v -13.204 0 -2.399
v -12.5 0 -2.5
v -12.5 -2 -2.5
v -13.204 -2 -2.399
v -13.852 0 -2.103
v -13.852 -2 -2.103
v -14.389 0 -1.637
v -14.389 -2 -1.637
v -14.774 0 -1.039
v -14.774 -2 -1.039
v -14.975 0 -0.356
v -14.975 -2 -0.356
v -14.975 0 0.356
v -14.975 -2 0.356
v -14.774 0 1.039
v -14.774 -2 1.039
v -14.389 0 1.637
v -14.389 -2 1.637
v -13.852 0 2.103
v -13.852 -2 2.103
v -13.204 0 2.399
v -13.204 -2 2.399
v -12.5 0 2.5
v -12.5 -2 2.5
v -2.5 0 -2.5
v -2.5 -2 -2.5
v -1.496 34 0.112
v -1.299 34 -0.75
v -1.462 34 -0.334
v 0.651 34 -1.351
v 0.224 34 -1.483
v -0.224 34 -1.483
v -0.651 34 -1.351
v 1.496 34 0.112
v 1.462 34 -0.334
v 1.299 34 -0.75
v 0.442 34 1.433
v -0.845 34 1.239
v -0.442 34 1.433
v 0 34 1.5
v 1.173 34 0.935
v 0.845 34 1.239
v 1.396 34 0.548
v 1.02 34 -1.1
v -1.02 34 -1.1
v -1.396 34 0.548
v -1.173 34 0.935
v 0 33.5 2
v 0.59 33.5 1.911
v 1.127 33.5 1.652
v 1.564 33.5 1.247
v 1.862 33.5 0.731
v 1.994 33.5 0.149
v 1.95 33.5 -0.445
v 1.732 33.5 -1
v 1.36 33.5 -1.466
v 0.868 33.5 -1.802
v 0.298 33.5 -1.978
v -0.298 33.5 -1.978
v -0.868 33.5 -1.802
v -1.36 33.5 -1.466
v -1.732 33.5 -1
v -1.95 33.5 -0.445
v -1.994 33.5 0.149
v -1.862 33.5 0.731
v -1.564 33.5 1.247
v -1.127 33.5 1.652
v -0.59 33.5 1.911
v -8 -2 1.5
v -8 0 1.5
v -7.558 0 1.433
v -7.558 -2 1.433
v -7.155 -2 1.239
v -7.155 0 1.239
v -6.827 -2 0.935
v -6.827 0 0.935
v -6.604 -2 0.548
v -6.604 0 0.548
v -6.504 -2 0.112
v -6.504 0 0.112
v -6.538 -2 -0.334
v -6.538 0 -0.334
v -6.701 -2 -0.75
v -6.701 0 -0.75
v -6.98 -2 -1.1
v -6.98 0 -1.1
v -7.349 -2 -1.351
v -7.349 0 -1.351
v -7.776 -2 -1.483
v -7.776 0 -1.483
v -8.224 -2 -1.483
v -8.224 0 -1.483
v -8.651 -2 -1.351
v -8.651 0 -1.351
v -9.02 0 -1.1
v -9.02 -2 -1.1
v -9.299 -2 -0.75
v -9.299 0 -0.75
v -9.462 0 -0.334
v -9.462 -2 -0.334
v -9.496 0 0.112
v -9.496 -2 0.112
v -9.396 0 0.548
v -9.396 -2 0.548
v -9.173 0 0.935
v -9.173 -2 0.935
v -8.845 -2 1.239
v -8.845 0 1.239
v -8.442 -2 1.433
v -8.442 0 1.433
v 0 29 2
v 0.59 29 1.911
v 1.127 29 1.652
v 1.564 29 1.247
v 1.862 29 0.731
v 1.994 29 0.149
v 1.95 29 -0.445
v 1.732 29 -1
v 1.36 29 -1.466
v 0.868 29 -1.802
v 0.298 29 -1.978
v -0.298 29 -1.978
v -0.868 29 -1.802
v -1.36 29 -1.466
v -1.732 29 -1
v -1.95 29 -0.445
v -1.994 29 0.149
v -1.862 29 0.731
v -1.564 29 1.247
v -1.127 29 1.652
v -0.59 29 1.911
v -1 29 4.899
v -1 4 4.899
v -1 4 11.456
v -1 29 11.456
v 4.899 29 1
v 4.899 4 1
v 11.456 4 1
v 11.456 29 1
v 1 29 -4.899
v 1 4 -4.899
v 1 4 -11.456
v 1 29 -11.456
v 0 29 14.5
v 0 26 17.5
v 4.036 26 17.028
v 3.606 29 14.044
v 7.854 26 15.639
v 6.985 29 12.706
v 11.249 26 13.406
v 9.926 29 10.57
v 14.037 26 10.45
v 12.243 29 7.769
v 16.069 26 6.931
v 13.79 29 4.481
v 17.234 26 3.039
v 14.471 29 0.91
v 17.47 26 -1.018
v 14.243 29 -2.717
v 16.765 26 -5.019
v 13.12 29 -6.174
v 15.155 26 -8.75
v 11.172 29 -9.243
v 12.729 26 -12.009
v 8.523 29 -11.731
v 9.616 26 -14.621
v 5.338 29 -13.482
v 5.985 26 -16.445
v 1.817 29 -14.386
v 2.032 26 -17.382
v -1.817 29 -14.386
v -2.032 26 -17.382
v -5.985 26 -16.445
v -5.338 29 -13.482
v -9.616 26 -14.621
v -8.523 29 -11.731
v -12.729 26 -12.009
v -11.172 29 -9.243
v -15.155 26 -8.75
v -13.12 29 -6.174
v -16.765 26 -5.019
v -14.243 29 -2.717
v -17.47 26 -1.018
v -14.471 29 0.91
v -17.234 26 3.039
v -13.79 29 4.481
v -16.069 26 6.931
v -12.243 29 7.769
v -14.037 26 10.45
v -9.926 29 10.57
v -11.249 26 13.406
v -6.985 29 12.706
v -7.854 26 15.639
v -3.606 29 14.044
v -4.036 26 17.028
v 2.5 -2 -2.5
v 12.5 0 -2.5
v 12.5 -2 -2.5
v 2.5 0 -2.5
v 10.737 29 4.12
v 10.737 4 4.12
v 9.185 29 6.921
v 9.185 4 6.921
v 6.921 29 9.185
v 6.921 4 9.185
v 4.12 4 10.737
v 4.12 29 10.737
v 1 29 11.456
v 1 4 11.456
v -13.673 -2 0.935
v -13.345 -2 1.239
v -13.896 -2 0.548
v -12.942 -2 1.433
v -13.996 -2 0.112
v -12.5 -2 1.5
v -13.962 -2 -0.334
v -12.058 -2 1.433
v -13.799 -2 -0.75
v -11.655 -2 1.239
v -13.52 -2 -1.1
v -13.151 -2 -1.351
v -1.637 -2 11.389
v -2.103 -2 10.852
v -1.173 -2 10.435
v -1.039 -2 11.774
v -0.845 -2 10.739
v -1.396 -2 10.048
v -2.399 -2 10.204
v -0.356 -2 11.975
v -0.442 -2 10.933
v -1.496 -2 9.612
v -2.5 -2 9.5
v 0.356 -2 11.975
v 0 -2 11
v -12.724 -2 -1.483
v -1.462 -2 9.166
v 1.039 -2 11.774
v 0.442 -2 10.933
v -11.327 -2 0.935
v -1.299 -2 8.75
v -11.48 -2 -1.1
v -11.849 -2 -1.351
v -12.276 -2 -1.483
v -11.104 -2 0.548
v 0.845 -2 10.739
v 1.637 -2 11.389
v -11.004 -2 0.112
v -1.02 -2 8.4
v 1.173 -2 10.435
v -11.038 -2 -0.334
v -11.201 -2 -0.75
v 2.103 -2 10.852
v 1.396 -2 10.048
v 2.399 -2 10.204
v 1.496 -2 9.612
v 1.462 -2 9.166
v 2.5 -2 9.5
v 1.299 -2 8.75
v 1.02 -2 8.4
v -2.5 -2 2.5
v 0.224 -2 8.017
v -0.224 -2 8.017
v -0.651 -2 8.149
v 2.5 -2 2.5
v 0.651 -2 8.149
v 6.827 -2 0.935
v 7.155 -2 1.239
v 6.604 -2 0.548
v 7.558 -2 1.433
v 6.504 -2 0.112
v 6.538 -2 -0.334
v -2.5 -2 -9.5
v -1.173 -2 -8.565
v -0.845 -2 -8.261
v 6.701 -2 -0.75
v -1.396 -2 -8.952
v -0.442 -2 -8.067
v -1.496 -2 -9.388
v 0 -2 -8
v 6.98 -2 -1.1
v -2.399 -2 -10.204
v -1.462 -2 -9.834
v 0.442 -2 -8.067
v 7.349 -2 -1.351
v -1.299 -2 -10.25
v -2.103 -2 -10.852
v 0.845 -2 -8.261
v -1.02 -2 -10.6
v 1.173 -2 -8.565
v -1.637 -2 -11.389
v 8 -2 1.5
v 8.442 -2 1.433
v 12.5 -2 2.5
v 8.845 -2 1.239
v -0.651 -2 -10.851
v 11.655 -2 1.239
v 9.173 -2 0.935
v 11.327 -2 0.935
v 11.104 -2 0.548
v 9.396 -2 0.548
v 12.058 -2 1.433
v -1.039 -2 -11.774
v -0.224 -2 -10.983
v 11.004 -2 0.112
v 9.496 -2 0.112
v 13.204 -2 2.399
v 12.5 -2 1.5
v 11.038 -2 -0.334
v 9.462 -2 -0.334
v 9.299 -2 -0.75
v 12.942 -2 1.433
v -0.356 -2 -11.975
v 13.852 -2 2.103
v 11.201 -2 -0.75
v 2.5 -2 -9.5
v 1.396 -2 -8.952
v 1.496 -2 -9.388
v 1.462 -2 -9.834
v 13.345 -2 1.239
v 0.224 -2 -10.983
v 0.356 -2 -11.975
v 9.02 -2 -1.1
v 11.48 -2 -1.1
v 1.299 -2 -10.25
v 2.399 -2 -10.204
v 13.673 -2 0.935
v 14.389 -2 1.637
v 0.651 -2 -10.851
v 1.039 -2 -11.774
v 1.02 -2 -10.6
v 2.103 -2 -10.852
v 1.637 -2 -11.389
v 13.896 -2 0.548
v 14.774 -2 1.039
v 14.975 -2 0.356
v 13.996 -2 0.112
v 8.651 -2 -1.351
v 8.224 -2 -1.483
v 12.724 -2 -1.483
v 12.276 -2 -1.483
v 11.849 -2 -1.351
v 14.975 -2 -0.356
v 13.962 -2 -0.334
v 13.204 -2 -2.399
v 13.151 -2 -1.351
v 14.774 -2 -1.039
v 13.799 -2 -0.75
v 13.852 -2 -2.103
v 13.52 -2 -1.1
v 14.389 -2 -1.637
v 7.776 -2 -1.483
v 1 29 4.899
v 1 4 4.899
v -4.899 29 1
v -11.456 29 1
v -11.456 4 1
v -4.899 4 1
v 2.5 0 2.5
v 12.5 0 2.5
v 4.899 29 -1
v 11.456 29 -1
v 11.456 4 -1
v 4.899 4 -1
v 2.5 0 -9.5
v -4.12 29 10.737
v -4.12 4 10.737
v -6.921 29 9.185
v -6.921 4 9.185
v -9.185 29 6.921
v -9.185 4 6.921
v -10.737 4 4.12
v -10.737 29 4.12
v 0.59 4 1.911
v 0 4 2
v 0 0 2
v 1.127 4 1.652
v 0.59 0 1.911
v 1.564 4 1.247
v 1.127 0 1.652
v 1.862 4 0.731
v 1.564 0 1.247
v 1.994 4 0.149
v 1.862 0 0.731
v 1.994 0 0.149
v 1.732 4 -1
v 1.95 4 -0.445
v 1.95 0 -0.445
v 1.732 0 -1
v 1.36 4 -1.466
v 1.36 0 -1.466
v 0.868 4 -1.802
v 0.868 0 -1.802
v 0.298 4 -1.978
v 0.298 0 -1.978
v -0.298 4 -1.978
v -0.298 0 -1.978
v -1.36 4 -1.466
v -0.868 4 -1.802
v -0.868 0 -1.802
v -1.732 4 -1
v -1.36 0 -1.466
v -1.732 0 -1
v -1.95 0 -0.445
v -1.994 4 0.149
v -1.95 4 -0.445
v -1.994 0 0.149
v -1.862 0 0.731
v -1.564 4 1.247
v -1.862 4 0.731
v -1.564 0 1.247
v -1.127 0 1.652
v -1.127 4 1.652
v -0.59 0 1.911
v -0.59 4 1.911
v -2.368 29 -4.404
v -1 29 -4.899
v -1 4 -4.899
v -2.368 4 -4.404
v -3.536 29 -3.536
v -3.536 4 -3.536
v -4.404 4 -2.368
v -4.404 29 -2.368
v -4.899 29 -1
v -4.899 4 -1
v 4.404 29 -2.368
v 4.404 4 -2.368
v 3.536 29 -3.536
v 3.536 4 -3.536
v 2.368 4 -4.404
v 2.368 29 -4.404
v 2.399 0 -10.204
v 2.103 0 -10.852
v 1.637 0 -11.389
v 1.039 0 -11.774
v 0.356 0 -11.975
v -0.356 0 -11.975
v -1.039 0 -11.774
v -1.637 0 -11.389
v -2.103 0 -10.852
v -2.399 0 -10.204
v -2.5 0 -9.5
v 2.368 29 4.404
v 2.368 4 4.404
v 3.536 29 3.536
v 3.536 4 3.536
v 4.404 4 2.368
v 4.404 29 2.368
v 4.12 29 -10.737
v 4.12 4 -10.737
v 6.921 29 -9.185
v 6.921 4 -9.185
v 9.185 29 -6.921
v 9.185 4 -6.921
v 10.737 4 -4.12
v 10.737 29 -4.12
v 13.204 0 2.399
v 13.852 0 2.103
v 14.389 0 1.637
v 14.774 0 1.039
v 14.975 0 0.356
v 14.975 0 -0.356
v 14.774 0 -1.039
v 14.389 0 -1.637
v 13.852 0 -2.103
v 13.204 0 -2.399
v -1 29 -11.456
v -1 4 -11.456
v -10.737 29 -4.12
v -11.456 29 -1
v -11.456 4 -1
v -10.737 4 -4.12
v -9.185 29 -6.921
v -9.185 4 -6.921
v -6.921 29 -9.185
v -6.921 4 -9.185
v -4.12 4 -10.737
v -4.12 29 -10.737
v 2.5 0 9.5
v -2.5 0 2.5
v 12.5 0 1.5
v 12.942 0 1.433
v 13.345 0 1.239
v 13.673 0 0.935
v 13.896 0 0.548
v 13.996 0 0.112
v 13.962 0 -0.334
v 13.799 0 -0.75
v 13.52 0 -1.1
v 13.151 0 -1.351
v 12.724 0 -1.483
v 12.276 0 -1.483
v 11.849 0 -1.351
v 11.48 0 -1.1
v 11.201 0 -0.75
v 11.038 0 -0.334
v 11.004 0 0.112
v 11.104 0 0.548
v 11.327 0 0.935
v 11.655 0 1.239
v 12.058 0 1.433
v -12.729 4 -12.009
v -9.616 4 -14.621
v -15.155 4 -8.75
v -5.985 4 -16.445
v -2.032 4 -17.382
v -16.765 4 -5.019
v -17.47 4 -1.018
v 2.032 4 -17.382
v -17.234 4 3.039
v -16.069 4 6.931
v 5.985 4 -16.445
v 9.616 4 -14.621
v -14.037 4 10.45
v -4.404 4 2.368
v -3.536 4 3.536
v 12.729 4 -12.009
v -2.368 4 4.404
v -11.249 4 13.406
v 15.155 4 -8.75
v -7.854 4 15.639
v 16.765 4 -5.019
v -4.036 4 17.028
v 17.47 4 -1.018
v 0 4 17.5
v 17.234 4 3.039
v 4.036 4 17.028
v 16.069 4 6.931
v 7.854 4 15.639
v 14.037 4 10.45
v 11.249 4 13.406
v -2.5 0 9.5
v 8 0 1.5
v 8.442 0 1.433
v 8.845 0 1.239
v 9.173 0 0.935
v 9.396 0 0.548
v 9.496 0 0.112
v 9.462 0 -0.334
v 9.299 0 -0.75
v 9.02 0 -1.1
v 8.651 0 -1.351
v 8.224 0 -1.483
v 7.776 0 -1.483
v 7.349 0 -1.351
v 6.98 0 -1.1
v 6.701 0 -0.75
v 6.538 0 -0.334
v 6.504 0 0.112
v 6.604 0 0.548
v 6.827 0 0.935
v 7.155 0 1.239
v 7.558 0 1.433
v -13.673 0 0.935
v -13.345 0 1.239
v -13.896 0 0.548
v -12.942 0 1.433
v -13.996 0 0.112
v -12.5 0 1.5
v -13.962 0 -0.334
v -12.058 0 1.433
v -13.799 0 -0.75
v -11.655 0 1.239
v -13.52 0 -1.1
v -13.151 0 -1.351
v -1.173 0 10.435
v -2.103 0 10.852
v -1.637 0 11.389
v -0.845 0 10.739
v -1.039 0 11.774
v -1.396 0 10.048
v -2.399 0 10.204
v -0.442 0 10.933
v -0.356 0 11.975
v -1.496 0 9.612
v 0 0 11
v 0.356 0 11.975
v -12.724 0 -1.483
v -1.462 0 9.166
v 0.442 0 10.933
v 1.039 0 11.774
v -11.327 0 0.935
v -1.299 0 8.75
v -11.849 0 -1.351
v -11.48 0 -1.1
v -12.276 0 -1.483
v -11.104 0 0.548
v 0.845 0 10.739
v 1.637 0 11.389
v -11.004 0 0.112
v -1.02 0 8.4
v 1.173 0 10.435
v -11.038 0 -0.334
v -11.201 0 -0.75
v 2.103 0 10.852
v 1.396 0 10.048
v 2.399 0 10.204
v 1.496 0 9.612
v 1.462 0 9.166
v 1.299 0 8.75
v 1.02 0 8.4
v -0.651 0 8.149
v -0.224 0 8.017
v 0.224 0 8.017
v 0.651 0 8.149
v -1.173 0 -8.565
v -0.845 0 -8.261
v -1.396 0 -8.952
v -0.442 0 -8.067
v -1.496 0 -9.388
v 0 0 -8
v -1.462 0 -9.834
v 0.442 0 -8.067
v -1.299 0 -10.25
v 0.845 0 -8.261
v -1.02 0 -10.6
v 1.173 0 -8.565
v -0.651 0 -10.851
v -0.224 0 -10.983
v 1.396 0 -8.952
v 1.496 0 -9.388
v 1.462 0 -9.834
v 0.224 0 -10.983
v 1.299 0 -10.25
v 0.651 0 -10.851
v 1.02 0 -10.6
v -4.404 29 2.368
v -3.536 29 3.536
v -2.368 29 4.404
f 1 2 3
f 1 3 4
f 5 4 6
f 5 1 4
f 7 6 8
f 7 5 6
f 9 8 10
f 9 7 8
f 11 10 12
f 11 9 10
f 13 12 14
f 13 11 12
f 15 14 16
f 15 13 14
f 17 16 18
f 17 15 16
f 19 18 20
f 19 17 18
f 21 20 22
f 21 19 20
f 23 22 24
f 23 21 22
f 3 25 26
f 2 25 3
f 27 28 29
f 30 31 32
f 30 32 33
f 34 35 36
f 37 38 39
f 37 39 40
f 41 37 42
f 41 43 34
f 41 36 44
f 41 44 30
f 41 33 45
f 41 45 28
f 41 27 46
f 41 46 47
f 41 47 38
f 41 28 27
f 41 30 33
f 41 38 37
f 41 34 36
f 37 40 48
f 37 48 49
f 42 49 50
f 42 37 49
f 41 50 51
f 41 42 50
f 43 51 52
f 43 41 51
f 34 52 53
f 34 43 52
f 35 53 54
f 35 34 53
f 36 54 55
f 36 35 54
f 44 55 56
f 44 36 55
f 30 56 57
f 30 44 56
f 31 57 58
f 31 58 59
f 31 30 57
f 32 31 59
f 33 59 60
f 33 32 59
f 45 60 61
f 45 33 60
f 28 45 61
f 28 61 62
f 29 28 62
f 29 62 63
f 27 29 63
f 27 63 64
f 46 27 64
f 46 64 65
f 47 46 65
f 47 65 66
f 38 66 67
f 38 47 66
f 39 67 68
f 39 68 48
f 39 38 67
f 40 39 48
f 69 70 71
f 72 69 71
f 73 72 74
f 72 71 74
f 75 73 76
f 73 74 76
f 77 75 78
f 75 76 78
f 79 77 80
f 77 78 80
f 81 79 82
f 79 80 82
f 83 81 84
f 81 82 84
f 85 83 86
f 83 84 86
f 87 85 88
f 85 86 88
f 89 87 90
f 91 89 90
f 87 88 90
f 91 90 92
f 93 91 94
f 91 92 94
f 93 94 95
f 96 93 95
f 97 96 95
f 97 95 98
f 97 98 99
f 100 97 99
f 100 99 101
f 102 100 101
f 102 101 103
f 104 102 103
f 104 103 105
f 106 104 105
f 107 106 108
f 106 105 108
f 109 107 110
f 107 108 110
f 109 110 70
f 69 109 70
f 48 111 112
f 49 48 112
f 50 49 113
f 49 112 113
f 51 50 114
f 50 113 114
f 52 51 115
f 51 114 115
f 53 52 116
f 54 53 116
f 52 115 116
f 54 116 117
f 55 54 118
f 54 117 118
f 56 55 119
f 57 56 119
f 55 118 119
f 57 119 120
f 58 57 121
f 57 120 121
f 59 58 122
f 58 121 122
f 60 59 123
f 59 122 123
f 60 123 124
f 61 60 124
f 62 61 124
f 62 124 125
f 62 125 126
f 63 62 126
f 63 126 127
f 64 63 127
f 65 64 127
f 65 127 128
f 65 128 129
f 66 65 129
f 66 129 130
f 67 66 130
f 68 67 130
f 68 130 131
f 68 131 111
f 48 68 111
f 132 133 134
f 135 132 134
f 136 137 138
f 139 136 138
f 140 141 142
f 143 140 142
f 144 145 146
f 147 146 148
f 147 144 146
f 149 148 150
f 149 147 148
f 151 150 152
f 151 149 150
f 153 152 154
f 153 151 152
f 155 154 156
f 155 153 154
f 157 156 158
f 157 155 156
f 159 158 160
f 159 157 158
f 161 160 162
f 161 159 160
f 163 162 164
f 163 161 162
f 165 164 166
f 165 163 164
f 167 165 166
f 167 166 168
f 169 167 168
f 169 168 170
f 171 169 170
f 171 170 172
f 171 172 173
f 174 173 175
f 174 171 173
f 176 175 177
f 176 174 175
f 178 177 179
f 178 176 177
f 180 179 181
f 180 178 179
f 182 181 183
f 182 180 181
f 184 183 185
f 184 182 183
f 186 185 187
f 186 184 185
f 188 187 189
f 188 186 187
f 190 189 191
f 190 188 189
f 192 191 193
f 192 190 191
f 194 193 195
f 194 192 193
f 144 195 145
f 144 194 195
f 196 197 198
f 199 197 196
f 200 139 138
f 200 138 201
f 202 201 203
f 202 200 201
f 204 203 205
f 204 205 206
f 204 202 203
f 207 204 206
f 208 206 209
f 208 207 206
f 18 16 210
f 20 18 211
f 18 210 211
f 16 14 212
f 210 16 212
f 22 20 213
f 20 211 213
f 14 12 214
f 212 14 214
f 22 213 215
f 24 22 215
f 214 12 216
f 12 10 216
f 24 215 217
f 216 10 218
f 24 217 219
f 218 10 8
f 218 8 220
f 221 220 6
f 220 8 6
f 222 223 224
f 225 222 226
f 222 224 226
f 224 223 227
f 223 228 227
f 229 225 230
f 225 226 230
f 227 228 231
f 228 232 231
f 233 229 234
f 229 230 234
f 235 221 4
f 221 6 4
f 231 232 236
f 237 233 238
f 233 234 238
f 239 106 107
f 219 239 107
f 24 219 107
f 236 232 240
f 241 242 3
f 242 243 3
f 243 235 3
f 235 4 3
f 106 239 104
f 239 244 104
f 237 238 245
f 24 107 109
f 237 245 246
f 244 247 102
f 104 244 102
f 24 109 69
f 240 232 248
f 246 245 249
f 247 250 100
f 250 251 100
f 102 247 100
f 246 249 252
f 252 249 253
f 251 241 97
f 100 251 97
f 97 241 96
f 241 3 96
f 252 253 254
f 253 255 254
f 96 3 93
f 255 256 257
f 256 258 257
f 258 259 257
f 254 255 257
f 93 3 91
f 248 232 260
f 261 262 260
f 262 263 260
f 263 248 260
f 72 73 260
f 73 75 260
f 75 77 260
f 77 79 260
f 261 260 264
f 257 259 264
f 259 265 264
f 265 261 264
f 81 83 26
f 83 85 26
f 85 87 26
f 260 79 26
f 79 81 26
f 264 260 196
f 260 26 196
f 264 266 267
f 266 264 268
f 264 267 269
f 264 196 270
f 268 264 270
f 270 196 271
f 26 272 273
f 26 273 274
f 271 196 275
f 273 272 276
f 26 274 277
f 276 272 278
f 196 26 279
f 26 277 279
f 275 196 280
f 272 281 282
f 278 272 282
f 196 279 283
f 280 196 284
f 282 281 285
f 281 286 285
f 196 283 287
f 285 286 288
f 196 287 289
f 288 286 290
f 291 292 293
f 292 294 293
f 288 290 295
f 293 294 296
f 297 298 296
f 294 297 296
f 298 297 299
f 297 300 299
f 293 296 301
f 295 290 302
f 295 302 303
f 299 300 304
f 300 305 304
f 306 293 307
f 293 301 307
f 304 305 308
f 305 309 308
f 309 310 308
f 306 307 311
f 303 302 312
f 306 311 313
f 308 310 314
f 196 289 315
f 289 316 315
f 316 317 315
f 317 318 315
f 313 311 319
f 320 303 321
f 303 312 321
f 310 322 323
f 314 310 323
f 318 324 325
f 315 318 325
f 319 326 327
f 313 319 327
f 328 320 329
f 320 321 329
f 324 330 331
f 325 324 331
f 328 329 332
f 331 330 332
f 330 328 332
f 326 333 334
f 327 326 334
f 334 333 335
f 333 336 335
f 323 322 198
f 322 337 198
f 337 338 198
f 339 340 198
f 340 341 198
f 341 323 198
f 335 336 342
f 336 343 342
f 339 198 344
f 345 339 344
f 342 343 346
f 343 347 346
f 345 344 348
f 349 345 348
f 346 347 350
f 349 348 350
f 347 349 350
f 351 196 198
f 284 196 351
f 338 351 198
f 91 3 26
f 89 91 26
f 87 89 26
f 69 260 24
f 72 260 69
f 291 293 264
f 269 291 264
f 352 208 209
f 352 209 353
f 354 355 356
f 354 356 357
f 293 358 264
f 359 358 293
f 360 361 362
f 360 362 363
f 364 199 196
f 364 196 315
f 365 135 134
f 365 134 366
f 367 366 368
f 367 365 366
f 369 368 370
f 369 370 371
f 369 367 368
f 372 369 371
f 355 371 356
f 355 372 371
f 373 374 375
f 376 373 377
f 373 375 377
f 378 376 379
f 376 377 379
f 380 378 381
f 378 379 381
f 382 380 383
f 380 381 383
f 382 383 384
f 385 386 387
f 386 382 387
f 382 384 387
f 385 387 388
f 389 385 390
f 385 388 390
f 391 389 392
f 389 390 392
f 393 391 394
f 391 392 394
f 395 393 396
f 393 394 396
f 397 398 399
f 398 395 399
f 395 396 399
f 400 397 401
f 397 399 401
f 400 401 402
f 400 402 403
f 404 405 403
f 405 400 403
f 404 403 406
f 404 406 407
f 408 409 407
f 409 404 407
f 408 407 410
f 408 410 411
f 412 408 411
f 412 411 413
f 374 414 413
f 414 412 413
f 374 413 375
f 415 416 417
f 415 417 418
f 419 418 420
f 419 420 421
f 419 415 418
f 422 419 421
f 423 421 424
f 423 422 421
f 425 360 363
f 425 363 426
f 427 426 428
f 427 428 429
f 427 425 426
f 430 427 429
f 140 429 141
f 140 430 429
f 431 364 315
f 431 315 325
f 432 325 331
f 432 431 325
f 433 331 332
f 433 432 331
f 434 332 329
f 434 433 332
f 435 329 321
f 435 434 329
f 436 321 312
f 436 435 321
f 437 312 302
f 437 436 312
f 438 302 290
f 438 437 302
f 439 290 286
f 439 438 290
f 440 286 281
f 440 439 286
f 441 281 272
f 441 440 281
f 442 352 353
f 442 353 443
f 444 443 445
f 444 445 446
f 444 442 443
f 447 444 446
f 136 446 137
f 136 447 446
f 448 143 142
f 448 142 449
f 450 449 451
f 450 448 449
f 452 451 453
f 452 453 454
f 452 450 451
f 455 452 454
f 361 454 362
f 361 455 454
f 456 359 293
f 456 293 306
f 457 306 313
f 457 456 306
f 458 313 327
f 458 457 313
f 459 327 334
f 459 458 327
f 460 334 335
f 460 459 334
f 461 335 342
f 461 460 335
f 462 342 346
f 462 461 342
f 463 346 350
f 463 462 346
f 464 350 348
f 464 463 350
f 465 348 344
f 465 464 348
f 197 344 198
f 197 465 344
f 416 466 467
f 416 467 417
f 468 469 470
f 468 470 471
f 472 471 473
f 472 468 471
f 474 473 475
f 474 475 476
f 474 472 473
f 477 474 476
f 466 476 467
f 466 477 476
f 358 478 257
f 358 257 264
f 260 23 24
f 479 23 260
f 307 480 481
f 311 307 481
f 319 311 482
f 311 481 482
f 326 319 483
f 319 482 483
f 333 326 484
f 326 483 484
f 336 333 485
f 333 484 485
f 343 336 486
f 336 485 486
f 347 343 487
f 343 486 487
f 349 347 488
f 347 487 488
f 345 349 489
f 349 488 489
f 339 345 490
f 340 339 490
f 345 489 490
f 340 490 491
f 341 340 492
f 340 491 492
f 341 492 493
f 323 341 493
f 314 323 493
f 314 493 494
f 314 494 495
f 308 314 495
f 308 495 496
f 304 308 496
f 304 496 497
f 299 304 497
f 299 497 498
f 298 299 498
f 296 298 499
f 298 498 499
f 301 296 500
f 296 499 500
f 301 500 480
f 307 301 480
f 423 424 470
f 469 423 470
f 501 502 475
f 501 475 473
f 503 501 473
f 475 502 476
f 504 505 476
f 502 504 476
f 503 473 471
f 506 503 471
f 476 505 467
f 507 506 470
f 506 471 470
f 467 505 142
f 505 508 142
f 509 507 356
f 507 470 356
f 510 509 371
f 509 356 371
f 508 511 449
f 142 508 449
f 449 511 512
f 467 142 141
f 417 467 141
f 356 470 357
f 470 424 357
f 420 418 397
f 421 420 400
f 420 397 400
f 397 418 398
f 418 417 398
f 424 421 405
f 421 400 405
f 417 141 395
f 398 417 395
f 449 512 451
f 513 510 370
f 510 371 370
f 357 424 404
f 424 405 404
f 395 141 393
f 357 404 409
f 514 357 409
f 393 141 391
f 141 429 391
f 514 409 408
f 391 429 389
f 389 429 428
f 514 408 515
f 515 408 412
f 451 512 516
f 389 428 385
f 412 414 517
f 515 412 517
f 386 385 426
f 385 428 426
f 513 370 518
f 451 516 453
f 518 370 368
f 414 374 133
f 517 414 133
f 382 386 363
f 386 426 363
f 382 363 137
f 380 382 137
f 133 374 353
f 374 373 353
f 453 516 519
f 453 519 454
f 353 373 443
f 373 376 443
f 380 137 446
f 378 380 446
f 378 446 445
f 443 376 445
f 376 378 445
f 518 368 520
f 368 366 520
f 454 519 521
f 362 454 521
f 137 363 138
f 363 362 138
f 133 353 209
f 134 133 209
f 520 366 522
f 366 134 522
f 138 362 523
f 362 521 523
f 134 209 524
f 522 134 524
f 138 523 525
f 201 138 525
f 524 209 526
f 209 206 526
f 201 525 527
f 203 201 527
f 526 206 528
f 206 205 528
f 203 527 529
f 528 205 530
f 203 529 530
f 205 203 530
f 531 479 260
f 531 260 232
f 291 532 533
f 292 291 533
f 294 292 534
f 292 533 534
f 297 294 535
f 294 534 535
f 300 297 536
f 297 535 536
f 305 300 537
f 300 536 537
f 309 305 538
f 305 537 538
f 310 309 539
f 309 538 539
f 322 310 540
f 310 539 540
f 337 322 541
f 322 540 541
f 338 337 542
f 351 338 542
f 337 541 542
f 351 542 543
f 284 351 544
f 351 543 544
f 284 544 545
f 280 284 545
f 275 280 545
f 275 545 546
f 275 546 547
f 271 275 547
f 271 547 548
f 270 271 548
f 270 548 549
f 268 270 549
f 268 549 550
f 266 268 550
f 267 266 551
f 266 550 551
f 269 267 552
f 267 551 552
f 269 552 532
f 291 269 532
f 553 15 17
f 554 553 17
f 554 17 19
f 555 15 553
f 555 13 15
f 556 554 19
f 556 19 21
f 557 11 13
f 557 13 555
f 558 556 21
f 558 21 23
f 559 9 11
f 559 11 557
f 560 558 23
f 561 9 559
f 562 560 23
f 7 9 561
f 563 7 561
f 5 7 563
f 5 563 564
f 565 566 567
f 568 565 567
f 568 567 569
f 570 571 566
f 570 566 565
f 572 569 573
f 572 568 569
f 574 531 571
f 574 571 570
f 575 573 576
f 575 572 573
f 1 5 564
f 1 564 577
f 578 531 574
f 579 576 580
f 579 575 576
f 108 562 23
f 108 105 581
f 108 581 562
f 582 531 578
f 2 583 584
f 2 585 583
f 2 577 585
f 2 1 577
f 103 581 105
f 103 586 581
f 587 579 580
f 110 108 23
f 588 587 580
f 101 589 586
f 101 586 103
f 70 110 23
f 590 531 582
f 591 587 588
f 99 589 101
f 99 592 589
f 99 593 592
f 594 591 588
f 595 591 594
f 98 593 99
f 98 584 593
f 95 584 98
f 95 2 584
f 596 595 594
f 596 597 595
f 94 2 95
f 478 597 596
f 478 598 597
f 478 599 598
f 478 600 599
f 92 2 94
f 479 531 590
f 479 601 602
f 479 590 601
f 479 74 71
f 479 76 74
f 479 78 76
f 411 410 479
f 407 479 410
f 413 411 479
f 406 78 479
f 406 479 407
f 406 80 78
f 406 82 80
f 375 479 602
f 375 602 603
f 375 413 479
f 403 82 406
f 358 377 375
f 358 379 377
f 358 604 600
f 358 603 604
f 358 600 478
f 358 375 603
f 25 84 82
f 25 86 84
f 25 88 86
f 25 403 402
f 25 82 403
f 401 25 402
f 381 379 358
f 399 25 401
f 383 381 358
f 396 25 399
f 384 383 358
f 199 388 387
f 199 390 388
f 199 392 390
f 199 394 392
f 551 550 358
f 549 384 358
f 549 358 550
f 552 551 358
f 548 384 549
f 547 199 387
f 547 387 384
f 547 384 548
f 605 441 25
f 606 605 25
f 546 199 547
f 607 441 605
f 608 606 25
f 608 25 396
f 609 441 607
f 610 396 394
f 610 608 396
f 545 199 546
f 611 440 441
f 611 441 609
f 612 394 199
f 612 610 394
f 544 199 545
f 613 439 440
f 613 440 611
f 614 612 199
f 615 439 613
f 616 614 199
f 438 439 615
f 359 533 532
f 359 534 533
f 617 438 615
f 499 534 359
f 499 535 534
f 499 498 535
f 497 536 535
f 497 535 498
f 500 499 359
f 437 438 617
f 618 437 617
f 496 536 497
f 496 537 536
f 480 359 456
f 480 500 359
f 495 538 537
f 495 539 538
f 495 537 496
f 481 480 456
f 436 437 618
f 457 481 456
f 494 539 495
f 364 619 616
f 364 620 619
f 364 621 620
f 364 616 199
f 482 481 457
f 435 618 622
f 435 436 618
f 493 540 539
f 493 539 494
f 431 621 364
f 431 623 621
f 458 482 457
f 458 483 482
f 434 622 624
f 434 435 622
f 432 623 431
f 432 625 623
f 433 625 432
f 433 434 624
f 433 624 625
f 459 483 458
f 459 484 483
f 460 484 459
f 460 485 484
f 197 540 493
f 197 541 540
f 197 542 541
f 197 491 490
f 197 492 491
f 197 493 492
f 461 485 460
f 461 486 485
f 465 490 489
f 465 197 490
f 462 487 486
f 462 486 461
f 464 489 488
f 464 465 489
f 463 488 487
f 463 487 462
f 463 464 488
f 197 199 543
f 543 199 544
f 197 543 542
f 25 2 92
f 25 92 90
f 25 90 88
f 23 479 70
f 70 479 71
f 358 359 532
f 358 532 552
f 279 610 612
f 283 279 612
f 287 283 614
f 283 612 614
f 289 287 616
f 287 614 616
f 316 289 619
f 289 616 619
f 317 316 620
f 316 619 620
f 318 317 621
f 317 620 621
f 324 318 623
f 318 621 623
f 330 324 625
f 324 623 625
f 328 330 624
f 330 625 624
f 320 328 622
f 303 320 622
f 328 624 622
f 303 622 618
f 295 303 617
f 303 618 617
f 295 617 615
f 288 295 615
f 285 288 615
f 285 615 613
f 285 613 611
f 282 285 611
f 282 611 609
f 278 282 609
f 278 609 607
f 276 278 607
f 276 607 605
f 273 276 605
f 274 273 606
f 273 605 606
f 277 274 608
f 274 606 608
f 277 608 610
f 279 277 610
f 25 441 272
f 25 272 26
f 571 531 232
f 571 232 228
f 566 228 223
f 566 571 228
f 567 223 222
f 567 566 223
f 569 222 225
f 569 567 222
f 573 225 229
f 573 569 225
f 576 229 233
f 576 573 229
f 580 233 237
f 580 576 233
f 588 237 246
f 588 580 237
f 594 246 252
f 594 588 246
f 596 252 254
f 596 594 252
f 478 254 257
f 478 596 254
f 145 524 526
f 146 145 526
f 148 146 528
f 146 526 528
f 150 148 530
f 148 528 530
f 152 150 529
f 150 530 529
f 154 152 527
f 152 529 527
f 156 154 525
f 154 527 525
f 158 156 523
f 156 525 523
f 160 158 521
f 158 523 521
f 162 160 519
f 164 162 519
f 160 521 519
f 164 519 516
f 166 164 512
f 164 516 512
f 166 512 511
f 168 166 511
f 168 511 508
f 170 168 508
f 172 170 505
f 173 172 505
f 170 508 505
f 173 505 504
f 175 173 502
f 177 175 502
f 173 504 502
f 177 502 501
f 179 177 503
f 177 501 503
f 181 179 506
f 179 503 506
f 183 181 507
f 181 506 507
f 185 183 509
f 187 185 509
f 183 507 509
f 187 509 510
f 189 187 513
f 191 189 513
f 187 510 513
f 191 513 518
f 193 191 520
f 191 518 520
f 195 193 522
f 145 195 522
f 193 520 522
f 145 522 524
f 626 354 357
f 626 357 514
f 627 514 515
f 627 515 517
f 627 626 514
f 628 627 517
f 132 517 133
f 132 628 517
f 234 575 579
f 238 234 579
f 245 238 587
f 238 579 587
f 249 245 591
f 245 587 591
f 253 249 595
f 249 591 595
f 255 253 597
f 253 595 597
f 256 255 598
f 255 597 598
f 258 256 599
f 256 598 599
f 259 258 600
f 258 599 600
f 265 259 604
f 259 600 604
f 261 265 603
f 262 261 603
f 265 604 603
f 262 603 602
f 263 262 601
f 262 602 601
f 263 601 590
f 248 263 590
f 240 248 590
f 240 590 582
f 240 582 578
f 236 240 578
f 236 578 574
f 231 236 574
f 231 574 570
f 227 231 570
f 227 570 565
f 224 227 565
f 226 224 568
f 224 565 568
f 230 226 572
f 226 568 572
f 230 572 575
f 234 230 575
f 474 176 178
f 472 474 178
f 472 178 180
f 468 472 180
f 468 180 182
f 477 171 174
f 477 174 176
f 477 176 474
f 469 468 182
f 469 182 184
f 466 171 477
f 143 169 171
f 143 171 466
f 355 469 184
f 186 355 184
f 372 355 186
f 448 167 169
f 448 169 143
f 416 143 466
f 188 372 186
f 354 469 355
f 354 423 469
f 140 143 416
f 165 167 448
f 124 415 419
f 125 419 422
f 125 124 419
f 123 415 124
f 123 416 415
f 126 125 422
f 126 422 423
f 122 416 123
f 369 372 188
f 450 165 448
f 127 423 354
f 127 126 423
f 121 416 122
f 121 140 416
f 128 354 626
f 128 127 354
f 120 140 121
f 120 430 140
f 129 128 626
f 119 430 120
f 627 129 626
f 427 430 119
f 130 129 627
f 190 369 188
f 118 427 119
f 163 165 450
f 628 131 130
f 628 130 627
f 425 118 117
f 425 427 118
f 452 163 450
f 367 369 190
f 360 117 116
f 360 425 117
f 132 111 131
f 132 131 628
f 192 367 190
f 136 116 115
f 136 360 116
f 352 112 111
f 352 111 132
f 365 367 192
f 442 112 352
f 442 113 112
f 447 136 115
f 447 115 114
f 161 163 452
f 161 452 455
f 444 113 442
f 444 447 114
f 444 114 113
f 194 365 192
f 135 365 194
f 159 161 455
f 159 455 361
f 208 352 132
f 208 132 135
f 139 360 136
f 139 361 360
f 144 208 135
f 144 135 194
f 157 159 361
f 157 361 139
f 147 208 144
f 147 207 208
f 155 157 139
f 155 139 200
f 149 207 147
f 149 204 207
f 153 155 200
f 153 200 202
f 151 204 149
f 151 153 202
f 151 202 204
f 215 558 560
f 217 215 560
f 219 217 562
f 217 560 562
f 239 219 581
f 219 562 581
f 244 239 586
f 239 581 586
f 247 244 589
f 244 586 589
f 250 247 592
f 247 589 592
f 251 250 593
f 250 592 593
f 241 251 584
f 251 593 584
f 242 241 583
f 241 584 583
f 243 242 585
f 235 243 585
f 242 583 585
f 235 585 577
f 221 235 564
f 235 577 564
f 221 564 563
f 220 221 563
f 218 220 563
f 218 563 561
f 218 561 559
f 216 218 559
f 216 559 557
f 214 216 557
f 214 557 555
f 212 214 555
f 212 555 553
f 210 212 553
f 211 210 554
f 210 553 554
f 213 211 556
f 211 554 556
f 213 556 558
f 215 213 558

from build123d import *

# Parameters (mm, degrees)
SKETCH_1_R          = 1.5
EXTRUDE_1_DEPTH     = 2
SKETCH_1_3_R        = 2
EXTRUDE_2_DEPTH     = 34
EXTRUDE_START       = 4
SKETCH_2_R          = 17.5
EXTRUDE_3_DEPTH     = 25
CHAMFER_1_SIZE      = 3
CUT_EXTRUDE_1_DEPTH = 25
CHAMFER_2_SIZE      = 0.5


with BuildPart() as part:
    # 스케치1 → 보스-돌출1 (new body)
    with BuildSketch(Plane(origin=(0, 0, 0), x_dir=(1, 0, 0), z_dir=(0, 1, 0))):
        with BuildLine():
            Line((-2.5, -2.5), (-2.5, -9.5))
            ThreePointArc((-2.5, -9.5), (0, -12), (2.5, -9.5))
            Line((2.5, -9.5), (2.5, -2.5))
            Line((2.5, -2.5), (12.5, -2.5))
            ThreePointArc((12.5, -2.5), (15, 0), (12.5, 2.5))
            Line((12.5, 2.5), (2.5, 2.5))
            Line((2.5, 2.5), (2.5, 9.5))
            ThreePointArc((2.5, 9.5), (0, 12), (-2.5, 9.5))
            Line((-2.5, 9.5), (-2.5, 2.5))
            Line((-2.5, 2.5), (-12.5, 2.5))
            ThreePointArc((-12.5, 2.5), (-15, 0), (-12.5, -2.5))
            Line((-12.5, -2.5), (-2.5, -2.5))
        make_face()
        with Locations((0, -9.5)):
            Circle(SKETCH_1_R, mode=Mode.SUBTRACT)
        with Locations((-8, 0)):
            Circle(SKETCH_1_R, mode=Mode.SUBTRACT)
        with Locations((-12.5, 0)):
            Circle(SKETCH_1_R, mode=Mode.SUBTRACT)
        with Locations((0, 9.5)):
            Circle(SKETCH_1_R, mode=Mode.SUBTRACT)
        with Locations((12.5, 0)):
            Circle(SKETCH_1_R, mode=Mode.SUBTRACT)
        with Locations((8, 0)):
            Circle(SKETCH_1_R, mode=Mode.SUBTRACT)
    extrude(amount=-EXTRUDE_1_DEPTH)

    # 스케치1<3> → 보스-돌출2 (add)
    with BuildSketch(Plane(origin=(0, 0, 0), x_dir=(1, 0, 0), z_dir=(0, 1, 0))):
        Circle(SKETCH_1_3_R)
    extrude(amount=EXTRUDE_2_DEPTH)

    # 스케치2 → 보스-돌출3 (add)
    with BuildSketch(Plane(origin=(0, 0, 0), x_dir=(1, 0, 0), z_dir=(0, 1, 0)).offset(EXTRUDE_START)):
        Circle(SKETCH_2_R)
    extrude(amount=EXTRUDE_3_DEPTH)

    # 모따기1
    chamfer_1_edges = [part.edges().sort_by_distance(p)[0] for p in [
        (-17.5, 29, 0),
    ]]
    chamfer(chamfer_1_edges, length=CHAMFER_1_SIZE)

    # 스케치4 → 컷-돌출1 (cut)
    with BuildSketch(Plane(origin=(0, 29, 0), x_dir=(1, 0, 0), z_dir=(0, 1, 0))):
        with BuildLine():
            Line((-1, 4.898979486), (-1, 11.456439237))
            ThreePointArc((-1, 11.456439237), (-8.131727984, 8.131727984), (-11.456439237, 1))
            Line((-11.456439237, 1), (-4.898979486, 1))
            ThreePointArc((-4.898979486, 1), (-3.535533906, 3.535533906), (-1, 4.898979486))
        make_face()
        with BuildLine():
            Line((4.898979486, 1), (11.456439237, 1))
            ThreePointArc((11.456439237, 1), (8.131727984, 8.131727984), (1, 11.456439237))
            Line((1, 11.456439237), (1, 4.898979486))
            ThreePointArc((1, 4.898979486), (3.535533906, 3.535533906), (4.898979486, 1))
        make_face()
        with BuildLine():
            Line((1, -4.898979486), (1, -11.456439237))
            ThreePointArc((1, -11.456439237), (8.131727984, -8.131727984), (11.456439237, -1))
            Line((11.456439237, -1), (4.898979486, -1))
            ThreePointArc((4.898979486, -1), (3.535533906, -3.535533906), (1, -4.898979486))
        make_face()
        with BuildLine():
            Line((-4.898979486, -1), (-11.456439237, -1))
            ThreePointArc((-11.456439237, -1), (-8.131727984, -8.131727984), (-1, -11.456439237))
            Line((-1, -11.456439237), (-1, -4.898979486))
            ThreePointArc((-1, -4.898979486), (-3.535533906, -3.535533906), (-4.898979486, -1))
        make_face()
    extrude(amount=-CUT_EXTRUDE_1_DEPTH, mode=Mode.SUBTRACT)

    # 모따기2
    chamfer_2_edges = [part.edges().sort_by_distance(p)[0] for p in [
        (-2, 34, 0),
    ]]
    chamfer(chamfer_2_edges, length=CHAMFER_2_SIZE)


solid = part.part
